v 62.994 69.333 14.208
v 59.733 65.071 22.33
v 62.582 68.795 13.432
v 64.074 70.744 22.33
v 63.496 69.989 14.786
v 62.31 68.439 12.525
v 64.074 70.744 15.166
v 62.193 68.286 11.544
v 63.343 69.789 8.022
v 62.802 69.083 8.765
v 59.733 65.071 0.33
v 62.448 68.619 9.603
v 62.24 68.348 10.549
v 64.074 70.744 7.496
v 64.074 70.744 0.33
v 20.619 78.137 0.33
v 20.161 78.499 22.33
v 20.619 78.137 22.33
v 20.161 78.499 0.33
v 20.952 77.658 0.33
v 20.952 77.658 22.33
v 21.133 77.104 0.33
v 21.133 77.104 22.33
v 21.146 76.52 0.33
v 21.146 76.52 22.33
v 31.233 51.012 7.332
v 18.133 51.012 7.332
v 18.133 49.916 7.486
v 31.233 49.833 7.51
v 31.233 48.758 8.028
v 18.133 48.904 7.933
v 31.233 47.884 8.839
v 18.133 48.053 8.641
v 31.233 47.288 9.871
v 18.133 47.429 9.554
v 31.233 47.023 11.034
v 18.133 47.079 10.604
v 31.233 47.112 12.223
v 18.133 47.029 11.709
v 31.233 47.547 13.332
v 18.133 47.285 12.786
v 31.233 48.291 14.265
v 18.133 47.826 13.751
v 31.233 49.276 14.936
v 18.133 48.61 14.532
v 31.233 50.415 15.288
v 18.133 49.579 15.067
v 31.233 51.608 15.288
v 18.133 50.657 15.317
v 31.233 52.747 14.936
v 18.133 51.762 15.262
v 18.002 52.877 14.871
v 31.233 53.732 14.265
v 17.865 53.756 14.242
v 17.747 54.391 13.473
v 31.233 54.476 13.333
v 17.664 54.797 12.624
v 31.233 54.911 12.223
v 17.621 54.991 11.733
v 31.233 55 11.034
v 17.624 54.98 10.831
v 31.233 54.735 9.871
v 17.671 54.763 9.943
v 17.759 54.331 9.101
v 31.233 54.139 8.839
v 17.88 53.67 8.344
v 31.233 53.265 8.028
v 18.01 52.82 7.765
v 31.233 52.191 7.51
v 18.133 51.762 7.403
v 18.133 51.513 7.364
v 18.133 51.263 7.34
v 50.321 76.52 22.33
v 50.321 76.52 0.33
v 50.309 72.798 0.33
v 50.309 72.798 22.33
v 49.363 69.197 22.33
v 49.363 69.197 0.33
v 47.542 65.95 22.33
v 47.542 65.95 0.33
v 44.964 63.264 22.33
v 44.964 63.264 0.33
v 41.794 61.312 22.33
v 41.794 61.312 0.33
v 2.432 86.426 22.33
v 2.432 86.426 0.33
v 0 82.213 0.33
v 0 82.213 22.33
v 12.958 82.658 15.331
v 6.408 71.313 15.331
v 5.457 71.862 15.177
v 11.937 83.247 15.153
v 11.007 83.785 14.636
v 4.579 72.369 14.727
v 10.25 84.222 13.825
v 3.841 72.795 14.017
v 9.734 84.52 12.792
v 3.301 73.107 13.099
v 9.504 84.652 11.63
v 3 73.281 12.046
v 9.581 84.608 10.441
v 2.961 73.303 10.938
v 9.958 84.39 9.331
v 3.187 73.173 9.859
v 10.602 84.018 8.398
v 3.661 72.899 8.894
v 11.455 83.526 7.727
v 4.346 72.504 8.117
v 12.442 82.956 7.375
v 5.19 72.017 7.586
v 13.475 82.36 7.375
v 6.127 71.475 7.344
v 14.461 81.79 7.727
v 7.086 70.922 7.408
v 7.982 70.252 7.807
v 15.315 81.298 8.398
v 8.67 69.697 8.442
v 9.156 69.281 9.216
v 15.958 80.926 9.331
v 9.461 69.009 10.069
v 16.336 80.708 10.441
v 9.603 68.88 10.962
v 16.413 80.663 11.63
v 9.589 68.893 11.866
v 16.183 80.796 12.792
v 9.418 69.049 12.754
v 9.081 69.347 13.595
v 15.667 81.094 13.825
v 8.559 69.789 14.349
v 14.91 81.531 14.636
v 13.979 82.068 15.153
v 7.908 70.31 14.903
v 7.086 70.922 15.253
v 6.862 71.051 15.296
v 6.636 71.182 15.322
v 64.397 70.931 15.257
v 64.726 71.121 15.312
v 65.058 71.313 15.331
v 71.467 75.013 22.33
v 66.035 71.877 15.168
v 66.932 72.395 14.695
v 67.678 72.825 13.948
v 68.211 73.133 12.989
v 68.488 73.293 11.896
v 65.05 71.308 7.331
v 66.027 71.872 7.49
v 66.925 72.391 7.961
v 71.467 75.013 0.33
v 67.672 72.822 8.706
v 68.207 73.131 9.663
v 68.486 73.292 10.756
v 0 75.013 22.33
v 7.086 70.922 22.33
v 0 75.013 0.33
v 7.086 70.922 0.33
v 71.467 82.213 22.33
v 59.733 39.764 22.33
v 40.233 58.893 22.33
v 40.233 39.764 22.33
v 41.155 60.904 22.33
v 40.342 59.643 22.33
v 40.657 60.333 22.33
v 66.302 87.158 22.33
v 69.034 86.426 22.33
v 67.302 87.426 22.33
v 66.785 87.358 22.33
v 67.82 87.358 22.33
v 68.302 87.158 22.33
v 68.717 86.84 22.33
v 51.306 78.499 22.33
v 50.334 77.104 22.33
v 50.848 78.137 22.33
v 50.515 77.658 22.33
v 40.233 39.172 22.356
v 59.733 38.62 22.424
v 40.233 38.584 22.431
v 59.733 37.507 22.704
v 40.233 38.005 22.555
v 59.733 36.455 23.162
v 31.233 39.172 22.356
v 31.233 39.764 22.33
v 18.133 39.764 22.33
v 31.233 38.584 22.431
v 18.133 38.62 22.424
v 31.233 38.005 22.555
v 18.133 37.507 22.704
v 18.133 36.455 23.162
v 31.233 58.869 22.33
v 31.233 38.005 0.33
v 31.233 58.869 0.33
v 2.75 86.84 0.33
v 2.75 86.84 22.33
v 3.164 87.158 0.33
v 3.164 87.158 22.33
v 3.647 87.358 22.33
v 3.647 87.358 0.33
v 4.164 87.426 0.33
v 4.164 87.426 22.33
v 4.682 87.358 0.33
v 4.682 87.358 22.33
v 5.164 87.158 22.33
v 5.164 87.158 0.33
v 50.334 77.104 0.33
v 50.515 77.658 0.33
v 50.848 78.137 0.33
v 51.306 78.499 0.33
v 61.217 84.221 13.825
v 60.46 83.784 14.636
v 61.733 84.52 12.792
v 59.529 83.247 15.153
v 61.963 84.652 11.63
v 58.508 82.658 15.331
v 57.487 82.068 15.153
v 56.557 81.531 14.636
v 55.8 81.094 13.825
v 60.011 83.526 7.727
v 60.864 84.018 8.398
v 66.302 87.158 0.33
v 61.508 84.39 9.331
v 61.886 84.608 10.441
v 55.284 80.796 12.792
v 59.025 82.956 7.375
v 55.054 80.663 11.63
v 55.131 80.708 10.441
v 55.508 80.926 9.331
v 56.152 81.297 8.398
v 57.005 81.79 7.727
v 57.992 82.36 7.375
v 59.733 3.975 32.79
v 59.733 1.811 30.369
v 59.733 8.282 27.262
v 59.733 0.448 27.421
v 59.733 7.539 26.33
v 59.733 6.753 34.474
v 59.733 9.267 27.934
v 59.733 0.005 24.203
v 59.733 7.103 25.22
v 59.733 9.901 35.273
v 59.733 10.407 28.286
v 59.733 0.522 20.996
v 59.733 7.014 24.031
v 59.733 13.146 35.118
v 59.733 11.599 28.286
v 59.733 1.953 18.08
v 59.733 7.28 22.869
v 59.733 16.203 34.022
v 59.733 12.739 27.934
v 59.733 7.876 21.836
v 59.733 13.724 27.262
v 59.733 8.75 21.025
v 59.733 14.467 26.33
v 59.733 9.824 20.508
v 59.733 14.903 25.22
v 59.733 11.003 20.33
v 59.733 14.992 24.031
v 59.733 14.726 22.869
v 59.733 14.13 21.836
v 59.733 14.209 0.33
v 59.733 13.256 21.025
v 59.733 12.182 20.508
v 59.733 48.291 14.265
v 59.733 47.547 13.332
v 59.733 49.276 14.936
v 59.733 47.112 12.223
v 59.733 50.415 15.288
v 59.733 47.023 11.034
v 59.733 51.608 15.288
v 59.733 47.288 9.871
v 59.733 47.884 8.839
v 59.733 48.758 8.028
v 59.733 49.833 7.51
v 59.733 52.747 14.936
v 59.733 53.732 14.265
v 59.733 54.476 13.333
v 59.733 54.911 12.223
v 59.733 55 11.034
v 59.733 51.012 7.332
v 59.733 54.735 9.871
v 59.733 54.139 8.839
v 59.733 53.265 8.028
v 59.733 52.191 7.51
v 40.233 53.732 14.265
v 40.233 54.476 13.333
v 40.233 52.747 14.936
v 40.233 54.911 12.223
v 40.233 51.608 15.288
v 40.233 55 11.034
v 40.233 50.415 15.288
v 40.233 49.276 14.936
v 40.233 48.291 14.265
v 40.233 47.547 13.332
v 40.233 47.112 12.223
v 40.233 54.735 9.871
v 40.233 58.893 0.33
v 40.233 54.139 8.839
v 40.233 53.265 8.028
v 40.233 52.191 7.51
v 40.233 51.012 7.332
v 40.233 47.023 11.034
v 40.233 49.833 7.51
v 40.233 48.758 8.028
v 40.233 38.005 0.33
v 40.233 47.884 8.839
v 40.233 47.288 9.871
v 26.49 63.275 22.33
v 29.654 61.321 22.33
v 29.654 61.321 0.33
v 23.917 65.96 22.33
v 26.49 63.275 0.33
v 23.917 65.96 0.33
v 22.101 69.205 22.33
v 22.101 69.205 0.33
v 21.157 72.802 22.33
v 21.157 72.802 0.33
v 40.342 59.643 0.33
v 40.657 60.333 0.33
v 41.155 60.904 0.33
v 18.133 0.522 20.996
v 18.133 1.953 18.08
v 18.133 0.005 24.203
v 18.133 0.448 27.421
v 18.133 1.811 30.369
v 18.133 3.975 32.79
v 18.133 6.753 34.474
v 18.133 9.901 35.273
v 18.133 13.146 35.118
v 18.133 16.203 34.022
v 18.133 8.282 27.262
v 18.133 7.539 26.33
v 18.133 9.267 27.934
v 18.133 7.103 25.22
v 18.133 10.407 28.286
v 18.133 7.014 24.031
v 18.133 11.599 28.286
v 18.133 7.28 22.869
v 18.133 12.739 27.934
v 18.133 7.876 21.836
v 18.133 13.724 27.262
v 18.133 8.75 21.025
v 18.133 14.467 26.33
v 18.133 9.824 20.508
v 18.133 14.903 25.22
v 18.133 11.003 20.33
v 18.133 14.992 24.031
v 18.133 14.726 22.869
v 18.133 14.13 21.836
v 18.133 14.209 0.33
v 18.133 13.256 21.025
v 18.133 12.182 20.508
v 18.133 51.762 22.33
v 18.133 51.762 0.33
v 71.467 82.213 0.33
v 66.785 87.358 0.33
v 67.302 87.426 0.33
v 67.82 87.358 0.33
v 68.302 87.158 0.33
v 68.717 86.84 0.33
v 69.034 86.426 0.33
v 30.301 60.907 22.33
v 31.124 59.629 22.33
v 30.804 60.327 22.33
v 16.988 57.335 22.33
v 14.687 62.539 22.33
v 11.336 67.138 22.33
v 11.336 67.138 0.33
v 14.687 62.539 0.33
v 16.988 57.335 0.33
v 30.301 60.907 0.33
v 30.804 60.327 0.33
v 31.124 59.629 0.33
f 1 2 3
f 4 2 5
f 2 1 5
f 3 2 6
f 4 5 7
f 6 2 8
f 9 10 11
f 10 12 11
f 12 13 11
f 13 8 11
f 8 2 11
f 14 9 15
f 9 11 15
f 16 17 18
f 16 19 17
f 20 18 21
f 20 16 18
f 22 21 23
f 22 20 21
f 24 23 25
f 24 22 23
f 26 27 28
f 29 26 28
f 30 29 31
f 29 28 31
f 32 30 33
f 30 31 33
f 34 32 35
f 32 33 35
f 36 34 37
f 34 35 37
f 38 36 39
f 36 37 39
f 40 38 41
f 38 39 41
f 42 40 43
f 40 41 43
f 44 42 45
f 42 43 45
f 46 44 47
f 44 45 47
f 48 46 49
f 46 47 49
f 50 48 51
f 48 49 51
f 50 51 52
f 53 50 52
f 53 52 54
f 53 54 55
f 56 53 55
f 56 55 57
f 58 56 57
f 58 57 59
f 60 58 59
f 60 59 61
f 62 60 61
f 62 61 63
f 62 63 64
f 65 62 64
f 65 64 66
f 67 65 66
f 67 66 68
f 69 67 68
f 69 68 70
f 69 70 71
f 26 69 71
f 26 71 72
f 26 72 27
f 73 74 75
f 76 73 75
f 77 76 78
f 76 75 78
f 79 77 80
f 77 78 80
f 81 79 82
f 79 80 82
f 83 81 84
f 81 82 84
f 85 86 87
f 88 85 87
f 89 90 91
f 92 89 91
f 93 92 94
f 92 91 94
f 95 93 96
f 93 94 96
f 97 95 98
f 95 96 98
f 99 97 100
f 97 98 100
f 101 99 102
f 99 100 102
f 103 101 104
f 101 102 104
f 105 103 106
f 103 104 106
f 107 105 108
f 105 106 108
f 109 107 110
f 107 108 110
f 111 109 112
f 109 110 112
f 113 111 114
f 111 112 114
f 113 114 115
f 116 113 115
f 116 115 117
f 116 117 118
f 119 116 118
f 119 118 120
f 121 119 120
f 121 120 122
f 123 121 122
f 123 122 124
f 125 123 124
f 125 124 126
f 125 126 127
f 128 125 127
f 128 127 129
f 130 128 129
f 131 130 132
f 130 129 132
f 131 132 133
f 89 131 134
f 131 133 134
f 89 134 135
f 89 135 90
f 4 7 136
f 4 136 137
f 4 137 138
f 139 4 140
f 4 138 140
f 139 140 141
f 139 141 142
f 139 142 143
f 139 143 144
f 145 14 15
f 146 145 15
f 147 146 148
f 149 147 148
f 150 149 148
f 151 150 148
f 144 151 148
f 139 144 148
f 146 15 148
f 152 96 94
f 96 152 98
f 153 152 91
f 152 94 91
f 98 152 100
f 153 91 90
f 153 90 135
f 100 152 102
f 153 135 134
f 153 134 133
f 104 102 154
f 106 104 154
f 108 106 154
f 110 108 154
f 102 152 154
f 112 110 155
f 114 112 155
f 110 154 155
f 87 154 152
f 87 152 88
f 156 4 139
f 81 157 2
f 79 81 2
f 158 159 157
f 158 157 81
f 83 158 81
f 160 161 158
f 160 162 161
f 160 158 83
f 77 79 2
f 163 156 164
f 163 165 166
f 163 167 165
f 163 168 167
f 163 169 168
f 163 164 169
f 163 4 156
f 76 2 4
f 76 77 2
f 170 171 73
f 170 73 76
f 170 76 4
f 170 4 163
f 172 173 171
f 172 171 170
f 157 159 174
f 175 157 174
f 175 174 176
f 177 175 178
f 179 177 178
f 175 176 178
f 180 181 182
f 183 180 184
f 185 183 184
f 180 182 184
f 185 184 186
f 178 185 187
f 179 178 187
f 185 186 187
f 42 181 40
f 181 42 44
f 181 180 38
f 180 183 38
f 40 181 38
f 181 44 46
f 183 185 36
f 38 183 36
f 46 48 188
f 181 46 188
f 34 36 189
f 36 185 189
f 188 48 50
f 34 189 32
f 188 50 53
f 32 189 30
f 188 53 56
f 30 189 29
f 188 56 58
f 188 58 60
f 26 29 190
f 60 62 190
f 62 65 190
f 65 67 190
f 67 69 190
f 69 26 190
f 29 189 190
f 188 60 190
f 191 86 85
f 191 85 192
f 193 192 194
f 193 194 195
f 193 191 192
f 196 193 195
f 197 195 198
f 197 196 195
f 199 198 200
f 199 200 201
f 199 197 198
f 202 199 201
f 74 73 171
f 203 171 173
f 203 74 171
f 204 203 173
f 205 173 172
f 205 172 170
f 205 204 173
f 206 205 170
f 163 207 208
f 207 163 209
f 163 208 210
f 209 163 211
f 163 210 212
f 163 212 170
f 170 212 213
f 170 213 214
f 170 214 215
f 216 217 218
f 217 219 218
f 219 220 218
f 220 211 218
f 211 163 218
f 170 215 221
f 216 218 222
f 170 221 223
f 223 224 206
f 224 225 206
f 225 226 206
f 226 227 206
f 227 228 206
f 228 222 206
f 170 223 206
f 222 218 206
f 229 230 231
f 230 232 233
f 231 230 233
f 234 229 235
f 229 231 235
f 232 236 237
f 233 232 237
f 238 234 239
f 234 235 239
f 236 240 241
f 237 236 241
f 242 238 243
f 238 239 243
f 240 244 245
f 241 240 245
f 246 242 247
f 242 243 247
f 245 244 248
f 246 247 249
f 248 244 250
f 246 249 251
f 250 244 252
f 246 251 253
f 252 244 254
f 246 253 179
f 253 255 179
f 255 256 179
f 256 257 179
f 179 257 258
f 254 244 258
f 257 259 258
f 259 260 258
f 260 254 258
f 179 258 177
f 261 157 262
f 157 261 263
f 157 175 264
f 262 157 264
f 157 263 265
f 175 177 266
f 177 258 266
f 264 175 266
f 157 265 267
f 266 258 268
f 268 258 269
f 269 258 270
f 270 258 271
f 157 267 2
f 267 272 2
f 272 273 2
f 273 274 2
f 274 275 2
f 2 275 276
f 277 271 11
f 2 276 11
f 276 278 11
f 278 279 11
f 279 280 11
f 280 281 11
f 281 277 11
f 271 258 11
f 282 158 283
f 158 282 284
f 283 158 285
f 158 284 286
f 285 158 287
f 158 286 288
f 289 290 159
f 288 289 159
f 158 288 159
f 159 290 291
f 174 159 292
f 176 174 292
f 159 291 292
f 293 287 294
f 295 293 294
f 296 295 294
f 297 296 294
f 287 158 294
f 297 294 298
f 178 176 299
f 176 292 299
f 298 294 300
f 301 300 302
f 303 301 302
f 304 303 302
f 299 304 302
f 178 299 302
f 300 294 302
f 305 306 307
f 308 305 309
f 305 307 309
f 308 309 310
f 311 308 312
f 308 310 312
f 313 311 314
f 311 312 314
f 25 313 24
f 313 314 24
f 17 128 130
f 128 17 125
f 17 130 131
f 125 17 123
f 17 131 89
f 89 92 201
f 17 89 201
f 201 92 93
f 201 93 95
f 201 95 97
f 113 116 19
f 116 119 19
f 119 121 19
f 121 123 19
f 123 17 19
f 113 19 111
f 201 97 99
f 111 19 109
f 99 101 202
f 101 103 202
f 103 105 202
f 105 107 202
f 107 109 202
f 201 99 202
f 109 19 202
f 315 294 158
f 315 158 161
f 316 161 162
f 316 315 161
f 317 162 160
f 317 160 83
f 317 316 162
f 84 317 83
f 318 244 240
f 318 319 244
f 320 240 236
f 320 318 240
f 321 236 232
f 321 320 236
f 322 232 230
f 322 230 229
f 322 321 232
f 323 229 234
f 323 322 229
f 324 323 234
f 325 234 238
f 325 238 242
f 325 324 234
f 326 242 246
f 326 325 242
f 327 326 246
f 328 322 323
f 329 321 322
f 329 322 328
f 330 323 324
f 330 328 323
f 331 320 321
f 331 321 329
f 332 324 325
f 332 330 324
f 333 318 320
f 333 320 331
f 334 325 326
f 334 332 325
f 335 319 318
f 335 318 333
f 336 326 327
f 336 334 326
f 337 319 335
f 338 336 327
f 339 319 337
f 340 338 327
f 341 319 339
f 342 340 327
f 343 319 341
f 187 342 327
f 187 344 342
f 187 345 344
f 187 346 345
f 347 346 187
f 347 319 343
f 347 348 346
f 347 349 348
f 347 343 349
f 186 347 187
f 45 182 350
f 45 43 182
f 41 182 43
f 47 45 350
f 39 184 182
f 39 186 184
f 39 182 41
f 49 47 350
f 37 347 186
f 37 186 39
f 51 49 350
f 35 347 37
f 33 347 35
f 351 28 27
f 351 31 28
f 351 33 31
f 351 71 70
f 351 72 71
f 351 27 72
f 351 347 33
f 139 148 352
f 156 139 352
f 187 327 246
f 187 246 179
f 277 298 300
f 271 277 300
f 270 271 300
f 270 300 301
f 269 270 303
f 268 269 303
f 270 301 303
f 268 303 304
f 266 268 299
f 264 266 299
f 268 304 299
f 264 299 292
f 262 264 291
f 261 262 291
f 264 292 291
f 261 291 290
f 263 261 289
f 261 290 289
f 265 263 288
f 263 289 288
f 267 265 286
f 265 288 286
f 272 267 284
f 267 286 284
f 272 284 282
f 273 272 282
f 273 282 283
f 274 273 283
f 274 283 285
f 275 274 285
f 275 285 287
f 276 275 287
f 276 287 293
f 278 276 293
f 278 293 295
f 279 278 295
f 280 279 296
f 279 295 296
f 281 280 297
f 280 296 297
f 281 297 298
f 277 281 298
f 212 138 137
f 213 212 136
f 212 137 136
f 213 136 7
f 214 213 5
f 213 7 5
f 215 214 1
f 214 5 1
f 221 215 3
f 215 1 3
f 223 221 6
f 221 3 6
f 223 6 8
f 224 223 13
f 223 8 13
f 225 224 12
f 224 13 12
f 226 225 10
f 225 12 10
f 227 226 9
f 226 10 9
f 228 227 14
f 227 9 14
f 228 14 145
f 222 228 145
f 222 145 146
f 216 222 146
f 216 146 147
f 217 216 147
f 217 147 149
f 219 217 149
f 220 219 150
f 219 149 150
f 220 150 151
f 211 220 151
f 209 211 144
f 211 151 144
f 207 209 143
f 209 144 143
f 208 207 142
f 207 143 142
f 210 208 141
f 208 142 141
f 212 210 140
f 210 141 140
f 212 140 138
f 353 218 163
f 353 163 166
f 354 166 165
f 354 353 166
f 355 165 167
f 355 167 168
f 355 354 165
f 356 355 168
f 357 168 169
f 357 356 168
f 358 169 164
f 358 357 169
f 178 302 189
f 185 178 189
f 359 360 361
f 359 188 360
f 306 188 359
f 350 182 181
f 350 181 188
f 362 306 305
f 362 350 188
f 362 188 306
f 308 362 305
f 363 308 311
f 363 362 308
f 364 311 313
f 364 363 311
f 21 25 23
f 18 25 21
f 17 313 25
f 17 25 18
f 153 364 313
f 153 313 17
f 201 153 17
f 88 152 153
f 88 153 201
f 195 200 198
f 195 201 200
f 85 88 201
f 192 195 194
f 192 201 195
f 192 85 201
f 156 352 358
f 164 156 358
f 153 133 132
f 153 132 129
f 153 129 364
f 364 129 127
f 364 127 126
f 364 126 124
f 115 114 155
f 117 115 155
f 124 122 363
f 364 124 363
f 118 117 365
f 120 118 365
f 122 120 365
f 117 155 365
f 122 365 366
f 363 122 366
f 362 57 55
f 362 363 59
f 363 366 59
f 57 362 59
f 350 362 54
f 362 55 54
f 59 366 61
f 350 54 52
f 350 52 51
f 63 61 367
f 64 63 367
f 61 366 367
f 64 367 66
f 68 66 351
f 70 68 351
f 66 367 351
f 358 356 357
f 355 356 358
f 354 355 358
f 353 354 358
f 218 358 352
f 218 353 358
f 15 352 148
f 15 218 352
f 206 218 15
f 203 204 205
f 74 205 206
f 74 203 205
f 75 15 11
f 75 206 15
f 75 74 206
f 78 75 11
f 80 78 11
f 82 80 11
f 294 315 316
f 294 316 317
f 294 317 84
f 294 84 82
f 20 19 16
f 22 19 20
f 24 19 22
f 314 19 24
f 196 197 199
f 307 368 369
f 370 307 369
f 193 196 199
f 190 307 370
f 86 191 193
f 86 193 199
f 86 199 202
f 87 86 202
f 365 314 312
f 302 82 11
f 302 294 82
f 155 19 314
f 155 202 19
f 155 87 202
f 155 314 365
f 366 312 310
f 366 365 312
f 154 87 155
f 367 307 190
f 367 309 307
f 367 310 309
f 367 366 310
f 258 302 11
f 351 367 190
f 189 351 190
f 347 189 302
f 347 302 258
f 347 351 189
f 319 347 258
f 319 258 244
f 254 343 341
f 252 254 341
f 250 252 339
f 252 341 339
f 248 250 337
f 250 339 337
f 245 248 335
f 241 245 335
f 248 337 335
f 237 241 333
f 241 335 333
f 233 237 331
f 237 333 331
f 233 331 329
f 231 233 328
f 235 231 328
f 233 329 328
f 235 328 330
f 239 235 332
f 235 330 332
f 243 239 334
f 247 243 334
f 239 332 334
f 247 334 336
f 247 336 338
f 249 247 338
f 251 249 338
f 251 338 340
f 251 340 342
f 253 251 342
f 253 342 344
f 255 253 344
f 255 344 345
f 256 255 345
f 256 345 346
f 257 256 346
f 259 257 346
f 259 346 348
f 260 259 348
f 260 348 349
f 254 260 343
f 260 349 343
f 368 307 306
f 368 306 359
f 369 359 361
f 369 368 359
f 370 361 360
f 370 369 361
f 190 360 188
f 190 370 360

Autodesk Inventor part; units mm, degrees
ref_plane "YZ Plane" through (0, 0, 0) normal (1, 0, 0) x (0, 1, 0)
ref_plane "XZ Plane" through (0, 0, 0) normal (0, 1, 0) x (-1, 0, 0)
ref_plane "XY Plane" through (0, 0, 0) normal (0, 0, 1) x (1, 0, 0)
sketch "Sketch1" plane through (59.7334, 64.5979, 5.1545) normal (1, 0, 0) x (0, 1, 0)
  line L0 (18.8189, 17.1759) -> (22.8279, 17.1759) projected
  line L1 (18.8189, -4.3241) -> (22.8279, -4.3241) projected
  line L2 (22.3279, -4.8241) -> (19.3338, -4.8241) projected
  arc A0 (-48.3948, 28.867) -> (-62.6447, 12.9256) centre (-53.5949, 19.1757) ccw
  line L3 (-48.3948, 28.867) -> (-28.1429, 18.0072)
  line L4 (-24.8341, 17.1759) -> (22.8279, 17.1759)
  line L5 (22.8279, 17.1759) -> (22.8279, -4.3241)
  line L6 (22.8279, -4.3241) -> (22.8279, -4.8241)
  line L7 (22.8279, -4.8241) -> (22.3279, -4.8241)
  line L8 (22.3279, -4.8241) -> (-50.3885, -4.8241)
  line L9 (-50.3885, -4.8241) -> (-62.6447, 12.9256)
  arc A1 (-28.1429, 18.0072) -> (-24.8341, 17.1759) centre (-24.8333, 24.1792) ccw
  point P0 (-48.3934, 28.8694)
  point P1 (0.4728, 17.1759)
  point P2 (-13.5862, 6.178)
sketch "Sketch2" plane through (47.0121, 65.2772, 22.3304) normal (0, 0, 1) x (1, 0, 0)
  line L0 (17.0615, 5.4672) -> (24.4547, 9.7356)
  line L1 (24.4547, 9.7356) -> (24.4547, 16.9356)
  line L2 (24.4547, 16.9356) -> (22.0224, 21.1485)
  arc A0 (22.0224, 21.1485) -> (19.2903, 21.8806) centre (20.2903, 20.1485) ccw
  line L3 (22.0224, 21.1485) -> (20.2903, 20.1485) construction
  line L4 (19.2903, 21.8806) -> (20.2903, 20.1485) construction
  line L5 (19.2903, 21.8806) -> (4.2935, 13.2221)
  arc A1 (4.2935, 13.2221) -> (3.3088, 11.2431) centre (5.2935, 11.4901) ccw
  arc A2 (-25.8662, 11.2431) -> (3.3088, 11.2431) centre (-11.2787, 9.4277) ccw
  arc A3 (-25.8662, 11.2431) -> (-26.8509, 13.2221) centre (-27.8509, 11.4901) ccw
  line L6 (-26.8509, 13.2221) -> (-41.8477, 21.8806)
  arc A4 (-41.8477, 21.8806) -> (-44.5798, 21.1485) centre (-42.8477, 20.1485) ccw
  line L7 (-44.5798, 21.1485) -> (-47.0121, 16.9356)
  line L8 (-47.0121, 16.9356) -> (-47.0121, 16.9356)
  line L9 (-47.0121, 9.7356) -> (-39.9003, 5.6296) projected
  line L10 (-39.926, 5.6445) -> (-39.2899, 5.1683) projected
  line L11 (-39.926, 5.6445) -> (-47.0121, 9.7356)
  arc A5 (-28.8787, -13.5153) -> (-39.926, 5.6445) centre (-55.4557, -16.0746) ccw
  line L12 (12.7213, -0.2066) -> (17.0615, 5.4672)
  line L13 (12.7213, -65.2726) -> (12.7213, -49.0741) projected
  line L14 (12.7213, -65.2726) -> (12.7213, -25.5127)
  line L15 (12.7213, -65.2726) -> (-28.8787, -65.2726)
  line L16 (12.7213, -25.5127) -> (12.7213, -0.2066)
  line L17 (-28.8787, -65.2726) -> (-28.8787, -13.5153)
  line L18 (-47.0121, 9.7356) -> (-47.0121, 16.9356)
  line L19 (-6.7787, -27.2723) -> (-15.7787, -27.2723) projected
  line L20 (-6.7787, -27.2723) -> (-15.7787, -27.2723)
  line L21 (-6.7787, -27.2723) -> (-15.7787, -27.2723)
  line L22 (-15.7787, -27.2723) -> (-15.7787, -3.6713)
  line L23 (-15.7787, -3.6713) -> (-6.7787, -3.6713)
  line L24 (-6.7787, -3.6713) -> (-6.7787, -27.2723)
  arc A6 (-15.7787, -6.4085) -> (-17.3582, -3.9562) centre (-18.4721, -6.4085) ccw
  arc A7 (-5.218, -3.9648) -> (-6.7787, -6.384) centre (-4.1232, -6.384) ccw
  point P0 (-47.0121, -65.2772)
  point P1 (12.7213, -49.0728)
  point P2 (12.7213, -63.3241)
  point P3 (-15.7787, -5.7822)
  dimension "d3" = 2
  dimension "d4" = 90
  dimension "d5" = 2
  dimension "d6" = 26.7
  dimension "d7" = 2
  dimension "d8" = 90
  dimension "d13" = 0
extrude "Extrusion1" add sketch "Sketch1" along normal mid plane 200
extrude "Extrusion2" cut sketch "Sketch2" along normal mid plane 200 contours L12 L16 L14 L13 L15 L17 A5 L9 L18 L7 A4 L6 A3 A2 A6 L22 L19 L24 A7 A1 L5 A0 L2 L1 L0 keep common part
sketch "Sketch5" plane through (35.7334, 74.705, 22.3304) normal (0, 0, 1) x (1, 0, 0)
  point P0 (-35.7334, -74.705)
sketch "Sketch3" plane through (66.3024, 87.1578, 22.3304) normal (-0.4999998, 0.8660255, 0) x (0.8660255, 0.4999998, 0)
  ellipse E0 centre (-8.9999, 10.9997) end of major axis (-4.913, 11.323) minor radius 4.0997 projected
  point P0 (-100.9985, 22.3304)
sketch "Sketch4" plane through (20.1613, 78.4993, 22.3304) normal (0.5000005, 0.8660251, 0) x (0.8660251, -0.5000005, 0)
  ellipse E0 centre (-8.3172, 10.9997) end of major axis (-5.344, 8.1771) minor radius 4.0996 projected
  point P0 (21.7896, 22.3304)
sketch "Sketch6" plane through (18.1334, 14.2094, 0.3304) normal (-1, 0, 0) x (0, 0, 1)
  point P0 (-0.3304, -14.2094)
hole "Hole1" at (58.5083, 82.6578, 11.3306) direction (0.4999998, -0.8660255, 0) diameter 8 end through all clearance for "Countersunk Flat Head Screw ISO 2009/7046" size "M8" standard "ISO"
hole "Hole2" at (12.9584, 82.6579, 11.3307) direction (-0.5000005, -0.8660251, 0) diameter 8 end through all clearance for "Slotted Cheese Head Screw ISO 1207" size "M8" standard "ISO"
hole "Hole3" at (59.7334, 51.0116, 11.3325) at (59.7334, 11.003, 24.3302) direction (-1, 0, 0) diameter 8 end through all
properties part number "YZ_Roller"
